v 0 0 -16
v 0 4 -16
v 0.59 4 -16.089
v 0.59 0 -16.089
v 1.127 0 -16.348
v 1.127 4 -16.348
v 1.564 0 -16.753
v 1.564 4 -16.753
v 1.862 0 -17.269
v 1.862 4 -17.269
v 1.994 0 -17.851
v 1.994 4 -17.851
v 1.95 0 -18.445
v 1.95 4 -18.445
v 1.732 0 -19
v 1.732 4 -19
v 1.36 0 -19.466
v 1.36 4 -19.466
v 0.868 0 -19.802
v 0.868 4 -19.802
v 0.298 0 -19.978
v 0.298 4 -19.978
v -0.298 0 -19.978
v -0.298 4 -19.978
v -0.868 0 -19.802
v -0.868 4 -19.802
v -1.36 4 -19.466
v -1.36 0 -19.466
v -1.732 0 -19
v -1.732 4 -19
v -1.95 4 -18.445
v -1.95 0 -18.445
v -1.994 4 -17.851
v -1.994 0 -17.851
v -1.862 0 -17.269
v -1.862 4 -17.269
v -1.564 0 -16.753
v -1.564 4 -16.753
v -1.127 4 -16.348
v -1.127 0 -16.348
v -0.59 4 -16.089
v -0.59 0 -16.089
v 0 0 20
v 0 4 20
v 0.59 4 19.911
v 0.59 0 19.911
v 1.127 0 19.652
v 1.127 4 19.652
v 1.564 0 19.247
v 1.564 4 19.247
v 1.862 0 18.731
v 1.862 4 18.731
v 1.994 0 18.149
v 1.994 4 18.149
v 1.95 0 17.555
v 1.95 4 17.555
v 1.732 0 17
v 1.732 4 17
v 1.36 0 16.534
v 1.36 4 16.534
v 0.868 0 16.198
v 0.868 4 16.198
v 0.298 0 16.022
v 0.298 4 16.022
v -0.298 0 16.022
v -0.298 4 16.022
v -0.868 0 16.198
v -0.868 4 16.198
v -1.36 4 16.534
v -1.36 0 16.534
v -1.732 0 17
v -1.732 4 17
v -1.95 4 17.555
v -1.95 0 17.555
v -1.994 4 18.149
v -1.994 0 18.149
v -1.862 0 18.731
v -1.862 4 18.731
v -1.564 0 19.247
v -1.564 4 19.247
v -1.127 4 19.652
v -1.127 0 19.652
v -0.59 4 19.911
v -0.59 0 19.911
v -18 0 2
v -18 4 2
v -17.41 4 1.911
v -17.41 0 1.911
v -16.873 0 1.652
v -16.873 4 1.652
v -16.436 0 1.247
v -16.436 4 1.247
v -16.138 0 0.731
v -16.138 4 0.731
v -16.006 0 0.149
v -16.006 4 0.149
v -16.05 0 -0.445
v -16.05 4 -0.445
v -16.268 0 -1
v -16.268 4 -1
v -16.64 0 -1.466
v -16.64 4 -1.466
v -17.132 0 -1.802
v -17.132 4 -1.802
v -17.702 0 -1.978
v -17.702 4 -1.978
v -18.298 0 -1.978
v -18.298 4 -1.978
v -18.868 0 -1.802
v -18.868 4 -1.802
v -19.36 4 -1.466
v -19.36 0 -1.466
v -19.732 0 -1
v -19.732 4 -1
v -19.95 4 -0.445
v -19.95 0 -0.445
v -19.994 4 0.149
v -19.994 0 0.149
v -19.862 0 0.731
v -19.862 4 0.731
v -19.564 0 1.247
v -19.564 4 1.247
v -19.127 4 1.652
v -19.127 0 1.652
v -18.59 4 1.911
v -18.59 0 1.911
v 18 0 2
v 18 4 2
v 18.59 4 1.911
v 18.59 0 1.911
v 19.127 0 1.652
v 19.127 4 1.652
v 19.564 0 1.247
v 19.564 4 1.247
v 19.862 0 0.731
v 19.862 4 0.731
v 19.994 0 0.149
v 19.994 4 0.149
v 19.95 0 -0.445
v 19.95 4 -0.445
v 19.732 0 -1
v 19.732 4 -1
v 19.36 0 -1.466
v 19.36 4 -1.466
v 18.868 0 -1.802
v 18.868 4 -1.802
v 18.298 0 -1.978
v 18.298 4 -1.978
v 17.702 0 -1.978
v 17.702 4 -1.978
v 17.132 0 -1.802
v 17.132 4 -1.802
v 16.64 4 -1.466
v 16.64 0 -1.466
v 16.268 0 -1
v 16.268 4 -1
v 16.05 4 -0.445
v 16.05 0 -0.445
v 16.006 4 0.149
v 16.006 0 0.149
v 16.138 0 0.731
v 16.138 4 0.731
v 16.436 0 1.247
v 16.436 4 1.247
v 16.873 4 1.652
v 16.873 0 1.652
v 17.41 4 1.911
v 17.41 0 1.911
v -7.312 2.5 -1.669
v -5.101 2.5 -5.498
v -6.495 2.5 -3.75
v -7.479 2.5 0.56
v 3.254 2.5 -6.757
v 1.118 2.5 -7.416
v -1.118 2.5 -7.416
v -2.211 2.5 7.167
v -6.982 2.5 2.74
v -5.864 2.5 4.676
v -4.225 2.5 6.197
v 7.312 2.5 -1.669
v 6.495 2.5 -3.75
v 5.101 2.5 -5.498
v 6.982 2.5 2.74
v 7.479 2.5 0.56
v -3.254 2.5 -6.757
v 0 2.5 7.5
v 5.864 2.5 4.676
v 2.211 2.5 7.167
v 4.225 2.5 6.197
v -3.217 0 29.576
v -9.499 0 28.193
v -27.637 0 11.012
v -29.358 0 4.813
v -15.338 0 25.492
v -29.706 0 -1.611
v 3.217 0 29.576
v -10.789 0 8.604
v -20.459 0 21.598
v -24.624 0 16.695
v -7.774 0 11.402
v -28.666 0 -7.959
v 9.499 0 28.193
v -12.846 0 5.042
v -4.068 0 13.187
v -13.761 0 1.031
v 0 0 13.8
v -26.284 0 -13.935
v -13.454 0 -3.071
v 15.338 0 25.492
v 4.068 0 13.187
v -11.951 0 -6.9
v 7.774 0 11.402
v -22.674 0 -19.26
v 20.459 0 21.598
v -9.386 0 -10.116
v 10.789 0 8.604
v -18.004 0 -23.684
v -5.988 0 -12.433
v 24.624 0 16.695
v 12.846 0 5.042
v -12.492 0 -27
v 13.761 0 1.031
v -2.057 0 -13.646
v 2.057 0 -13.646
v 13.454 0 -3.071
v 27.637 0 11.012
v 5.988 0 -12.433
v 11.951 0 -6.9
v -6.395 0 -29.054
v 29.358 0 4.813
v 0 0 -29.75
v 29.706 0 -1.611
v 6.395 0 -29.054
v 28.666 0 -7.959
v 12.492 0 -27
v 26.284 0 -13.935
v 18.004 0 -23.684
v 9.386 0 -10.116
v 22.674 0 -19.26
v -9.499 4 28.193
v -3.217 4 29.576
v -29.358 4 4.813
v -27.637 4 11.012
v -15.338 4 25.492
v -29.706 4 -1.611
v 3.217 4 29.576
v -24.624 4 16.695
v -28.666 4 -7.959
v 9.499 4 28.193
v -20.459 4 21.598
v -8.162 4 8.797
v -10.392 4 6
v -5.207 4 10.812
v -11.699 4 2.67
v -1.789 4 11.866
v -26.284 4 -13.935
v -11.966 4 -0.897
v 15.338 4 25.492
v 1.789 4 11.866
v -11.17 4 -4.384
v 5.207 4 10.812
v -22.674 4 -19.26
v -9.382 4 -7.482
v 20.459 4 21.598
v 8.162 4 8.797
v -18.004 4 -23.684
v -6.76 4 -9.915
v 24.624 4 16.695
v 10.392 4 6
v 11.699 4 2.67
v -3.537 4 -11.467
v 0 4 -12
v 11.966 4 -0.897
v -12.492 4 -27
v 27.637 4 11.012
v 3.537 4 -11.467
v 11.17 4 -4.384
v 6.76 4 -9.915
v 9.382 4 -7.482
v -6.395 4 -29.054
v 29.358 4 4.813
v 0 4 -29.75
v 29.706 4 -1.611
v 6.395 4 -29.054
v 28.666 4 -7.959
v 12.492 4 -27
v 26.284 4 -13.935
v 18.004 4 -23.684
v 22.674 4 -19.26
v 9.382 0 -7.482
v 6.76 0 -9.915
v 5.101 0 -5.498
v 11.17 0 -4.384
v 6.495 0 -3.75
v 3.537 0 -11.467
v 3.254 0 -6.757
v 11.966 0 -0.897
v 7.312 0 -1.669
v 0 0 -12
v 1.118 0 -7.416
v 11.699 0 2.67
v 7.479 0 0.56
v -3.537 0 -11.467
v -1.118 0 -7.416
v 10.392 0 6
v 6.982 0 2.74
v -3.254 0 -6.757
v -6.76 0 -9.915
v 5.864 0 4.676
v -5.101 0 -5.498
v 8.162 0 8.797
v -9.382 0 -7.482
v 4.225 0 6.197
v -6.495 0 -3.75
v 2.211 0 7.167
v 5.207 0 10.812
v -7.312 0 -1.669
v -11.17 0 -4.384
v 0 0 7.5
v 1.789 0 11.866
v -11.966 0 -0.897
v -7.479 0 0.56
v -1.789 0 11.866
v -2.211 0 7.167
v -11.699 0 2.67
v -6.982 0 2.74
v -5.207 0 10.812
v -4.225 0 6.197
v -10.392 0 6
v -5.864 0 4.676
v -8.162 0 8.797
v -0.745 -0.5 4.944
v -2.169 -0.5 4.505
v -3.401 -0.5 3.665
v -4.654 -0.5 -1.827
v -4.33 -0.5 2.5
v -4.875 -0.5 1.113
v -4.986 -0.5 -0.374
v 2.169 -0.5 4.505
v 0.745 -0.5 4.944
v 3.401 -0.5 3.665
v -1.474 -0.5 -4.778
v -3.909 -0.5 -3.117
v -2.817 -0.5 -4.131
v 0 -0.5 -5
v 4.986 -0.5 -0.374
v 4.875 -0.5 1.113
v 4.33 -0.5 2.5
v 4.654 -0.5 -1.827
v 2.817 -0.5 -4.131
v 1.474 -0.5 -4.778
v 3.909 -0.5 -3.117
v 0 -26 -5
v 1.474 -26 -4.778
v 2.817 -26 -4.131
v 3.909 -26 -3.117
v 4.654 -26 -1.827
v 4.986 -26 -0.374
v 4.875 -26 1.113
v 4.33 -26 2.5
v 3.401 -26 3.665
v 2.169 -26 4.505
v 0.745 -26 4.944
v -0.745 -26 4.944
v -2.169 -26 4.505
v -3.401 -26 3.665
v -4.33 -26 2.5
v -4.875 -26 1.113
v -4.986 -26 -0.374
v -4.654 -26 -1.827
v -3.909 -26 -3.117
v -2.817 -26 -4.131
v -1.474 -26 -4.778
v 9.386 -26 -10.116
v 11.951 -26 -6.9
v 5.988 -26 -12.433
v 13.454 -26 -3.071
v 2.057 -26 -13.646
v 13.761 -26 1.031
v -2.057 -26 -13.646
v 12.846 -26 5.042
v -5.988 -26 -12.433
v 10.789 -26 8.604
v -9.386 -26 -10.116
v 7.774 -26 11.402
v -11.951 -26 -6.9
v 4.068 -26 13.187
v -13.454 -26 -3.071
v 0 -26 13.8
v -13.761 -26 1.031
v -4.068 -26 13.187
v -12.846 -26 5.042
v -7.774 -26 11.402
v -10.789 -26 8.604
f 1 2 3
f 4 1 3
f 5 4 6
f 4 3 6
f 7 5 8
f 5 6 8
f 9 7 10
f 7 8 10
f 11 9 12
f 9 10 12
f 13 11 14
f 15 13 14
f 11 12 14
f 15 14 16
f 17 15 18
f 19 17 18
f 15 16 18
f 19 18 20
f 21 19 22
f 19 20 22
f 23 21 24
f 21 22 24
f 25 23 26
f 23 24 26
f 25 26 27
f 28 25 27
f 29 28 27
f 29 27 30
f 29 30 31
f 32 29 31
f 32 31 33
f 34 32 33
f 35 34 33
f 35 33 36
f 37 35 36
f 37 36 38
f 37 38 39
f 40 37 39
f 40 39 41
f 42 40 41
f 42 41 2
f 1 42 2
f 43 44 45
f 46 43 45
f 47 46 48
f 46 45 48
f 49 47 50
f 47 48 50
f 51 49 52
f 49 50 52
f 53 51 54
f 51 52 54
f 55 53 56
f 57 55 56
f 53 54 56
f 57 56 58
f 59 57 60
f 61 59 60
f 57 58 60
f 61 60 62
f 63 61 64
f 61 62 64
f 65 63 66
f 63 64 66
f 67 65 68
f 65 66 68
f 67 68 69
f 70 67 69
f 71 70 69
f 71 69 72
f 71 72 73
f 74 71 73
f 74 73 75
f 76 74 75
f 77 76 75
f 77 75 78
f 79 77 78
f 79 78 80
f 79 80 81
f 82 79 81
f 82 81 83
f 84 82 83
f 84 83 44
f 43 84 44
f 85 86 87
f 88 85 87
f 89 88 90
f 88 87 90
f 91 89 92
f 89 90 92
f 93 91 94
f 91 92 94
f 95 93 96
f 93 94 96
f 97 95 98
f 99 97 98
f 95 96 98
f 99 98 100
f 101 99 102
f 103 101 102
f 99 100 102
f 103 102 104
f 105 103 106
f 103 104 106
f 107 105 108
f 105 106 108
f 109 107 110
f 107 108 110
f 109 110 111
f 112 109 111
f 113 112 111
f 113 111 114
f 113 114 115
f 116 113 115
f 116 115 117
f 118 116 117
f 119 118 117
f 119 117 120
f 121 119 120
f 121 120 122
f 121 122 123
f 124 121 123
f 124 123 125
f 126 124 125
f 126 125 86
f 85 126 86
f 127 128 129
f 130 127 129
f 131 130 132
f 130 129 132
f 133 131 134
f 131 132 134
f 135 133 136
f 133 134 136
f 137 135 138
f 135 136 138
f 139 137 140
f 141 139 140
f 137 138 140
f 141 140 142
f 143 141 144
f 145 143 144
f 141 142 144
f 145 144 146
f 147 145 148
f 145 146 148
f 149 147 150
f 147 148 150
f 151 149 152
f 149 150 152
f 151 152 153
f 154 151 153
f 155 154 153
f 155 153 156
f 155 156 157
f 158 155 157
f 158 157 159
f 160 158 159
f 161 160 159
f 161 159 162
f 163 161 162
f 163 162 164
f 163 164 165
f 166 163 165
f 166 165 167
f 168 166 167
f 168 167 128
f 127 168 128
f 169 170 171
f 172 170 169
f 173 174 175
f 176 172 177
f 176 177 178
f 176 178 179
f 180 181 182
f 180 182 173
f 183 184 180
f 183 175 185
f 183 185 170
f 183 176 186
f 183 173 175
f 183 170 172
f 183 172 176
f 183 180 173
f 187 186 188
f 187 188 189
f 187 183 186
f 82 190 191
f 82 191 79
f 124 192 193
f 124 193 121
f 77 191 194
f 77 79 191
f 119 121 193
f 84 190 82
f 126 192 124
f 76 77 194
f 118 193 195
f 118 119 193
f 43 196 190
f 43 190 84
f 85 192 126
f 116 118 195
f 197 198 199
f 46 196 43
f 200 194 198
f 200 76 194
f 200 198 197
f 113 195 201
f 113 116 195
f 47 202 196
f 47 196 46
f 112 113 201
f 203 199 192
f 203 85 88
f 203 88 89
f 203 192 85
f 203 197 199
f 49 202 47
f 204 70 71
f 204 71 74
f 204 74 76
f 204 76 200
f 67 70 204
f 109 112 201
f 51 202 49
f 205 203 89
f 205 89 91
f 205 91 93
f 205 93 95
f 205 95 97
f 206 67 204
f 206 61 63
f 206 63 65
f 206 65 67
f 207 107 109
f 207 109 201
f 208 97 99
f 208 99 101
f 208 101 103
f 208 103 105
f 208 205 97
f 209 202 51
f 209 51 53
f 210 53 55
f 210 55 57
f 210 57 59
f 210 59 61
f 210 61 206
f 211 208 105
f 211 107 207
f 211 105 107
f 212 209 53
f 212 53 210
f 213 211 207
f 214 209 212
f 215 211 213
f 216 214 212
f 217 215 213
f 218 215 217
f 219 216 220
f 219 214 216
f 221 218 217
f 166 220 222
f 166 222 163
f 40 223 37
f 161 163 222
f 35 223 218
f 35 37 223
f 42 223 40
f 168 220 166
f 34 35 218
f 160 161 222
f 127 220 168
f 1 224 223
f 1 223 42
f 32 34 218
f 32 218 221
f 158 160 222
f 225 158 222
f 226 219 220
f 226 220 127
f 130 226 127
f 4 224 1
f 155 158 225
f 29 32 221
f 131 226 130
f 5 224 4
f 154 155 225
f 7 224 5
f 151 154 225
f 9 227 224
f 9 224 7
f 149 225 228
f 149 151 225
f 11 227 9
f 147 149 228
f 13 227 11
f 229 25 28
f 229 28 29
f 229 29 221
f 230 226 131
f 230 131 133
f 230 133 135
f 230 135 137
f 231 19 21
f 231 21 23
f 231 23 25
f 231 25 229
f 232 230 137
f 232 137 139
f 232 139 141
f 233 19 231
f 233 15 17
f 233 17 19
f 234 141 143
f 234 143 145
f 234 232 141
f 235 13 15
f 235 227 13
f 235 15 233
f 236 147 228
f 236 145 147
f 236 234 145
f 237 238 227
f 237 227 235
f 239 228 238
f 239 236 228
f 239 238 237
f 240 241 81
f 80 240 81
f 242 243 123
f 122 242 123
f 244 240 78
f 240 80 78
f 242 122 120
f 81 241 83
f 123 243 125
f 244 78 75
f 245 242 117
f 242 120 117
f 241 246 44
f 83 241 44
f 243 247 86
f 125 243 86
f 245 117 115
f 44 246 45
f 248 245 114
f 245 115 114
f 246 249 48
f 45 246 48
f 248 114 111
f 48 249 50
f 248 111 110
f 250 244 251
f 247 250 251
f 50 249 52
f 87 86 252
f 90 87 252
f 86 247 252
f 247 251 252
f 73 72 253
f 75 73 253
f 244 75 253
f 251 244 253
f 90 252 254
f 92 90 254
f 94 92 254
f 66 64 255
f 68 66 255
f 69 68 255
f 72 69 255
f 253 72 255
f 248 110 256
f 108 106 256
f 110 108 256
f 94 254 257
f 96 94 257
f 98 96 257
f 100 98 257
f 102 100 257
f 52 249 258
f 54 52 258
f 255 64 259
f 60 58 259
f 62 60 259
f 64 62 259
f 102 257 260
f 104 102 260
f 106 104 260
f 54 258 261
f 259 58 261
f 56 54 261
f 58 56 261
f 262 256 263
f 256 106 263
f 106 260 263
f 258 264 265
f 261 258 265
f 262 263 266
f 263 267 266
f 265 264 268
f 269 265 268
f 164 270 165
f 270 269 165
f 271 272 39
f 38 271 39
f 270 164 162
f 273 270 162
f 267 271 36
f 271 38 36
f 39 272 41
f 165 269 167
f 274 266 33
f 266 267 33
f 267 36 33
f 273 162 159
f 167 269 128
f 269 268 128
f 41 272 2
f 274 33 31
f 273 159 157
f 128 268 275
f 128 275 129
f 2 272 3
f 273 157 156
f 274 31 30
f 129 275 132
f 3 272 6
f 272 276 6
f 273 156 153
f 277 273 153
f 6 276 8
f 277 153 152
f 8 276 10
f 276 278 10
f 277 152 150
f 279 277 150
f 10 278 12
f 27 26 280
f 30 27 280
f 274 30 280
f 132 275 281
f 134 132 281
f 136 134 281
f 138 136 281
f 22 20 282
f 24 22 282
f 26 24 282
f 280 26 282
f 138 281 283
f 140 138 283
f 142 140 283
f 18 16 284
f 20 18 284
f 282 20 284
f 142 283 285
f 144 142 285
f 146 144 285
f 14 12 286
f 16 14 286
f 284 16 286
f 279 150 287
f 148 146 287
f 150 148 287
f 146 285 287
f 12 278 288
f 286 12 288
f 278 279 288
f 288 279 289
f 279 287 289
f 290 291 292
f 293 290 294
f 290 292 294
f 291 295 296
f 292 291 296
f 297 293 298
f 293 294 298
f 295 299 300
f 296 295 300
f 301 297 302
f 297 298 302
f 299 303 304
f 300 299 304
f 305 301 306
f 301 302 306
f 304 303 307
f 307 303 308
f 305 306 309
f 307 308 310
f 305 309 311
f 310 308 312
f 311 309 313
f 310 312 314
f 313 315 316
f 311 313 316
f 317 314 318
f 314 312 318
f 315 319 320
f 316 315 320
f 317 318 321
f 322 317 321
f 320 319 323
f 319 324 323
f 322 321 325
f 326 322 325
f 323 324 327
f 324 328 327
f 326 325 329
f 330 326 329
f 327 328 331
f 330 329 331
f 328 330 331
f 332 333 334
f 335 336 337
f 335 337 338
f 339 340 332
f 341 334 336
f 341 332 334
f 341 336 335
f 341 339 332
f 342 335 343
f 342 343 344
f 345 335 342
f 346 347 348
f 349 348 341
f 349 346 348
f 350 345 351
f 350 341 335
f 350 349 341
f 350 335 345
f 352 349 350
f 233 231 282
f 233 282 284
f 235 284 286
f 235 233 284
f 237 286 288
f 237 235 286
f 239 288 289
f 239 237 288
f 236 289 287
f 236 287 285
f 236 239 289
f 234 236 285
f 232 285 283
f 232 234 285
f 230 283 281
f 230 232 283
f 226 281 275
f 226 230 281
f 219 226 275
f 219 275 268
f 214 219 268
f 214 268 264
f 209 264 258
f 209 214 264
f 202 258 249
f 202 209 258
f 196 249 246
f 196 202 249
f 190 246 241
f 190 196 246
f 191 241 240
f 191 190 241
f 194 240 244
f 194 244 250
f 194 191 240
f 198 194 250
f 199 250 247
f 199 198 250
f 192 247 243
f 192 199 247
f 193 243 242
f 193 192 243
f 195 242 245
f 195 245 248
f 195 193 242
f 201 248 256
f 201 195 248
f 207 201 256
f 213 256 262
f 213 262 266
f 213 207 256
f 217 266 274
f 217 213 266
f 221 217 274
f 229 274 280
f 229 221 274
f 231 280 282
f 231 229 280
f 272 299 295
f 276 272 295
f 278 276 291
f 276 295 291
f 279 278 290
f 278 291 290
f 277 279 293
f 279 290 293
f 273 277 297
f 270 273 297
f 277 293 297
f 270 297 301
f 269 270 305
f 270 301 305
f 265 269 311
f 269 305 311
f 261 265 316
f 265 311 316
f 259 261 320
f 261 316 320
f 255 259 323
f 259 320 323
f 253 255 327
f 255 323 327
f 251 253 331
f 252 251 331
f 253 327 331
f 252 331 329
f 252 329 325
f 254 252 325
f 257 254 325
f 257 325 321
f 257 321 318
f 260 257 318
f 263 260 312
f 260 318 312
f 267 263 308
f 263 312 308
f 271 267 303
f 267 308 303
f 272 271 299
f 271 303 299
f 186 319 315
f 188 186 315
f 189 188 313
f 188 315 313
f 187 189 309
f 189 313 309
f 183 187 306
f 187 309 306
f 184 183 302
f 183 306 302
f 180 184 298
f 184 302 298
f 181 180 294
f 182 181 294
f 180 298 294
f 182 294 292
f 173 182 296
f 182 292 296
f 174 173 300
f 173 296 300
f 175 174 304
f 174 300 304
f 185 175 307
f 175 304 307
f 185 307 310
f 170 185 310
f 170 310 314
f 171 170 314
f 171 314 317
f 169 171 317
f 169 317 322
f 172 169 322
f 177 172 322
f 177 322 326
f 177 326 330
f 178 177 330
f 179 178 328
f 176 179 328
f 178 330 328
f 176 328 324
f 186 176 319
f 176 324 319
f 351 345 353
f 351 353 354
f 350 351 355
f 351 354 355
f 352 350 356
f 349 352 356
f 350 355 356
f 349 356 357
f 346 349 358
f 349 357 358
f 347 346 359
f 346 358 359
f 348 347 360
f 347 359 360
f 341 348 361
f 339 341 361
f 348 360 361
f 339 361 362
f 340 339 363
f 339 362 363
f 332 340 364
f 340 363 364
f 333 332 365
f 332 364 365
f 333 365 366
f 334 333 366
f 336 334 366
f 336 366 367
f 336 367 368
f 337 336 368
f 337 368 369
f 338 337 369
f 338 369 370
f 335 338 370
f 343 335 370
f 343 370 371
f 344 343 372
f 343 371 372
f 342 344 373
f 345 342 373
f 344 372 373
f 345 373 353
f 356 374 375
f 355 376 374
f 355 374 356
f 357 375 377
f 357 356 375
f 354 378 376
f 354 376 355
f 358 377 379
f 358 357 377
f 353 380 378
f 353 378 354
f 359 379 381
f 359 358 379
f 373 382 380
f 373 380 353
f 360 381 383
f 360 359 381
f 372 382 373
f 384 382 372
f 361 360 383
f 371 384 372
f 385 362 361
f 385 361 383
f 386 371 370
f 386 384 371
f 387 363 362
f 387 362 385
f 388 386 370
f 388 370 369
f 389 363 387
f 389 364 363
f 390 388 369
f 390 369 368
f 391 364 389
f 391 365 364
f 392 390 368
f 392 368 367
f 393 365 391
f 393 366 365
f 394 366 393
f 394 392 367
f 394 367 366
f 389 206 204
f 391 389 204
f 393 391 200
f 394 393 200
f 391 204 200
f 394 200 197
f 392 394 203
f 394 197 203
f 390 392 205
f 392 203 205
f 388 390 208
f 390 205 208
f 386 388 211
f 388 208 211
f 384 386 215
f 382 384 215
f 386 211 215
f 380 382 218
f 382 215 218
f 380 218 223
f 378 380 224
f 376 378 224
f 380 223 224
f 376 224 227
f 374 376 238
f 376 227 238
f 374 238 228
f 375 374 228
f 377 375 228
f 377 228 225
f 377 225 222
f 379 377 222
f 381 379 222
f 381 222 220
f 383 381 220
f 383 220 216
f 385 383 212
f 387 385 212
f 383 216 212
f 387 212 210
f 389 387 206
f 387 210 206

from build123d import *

# Parameters (mm, degrees)
SKETCH1_R           = 7.5
BOSS_EXTRUDE1_DEPTH = 2.5
SKETCH2_R           = 29.75
SKETCH2_R_2         = 12
BOSS_EXTRUDE2_DEPTH = 4
SKETCH3_R           = 13.8
BOSS_EXTRUDE3_DEPTH = 26
SKETCH4_R           = 5
CUT_EXTRUDE1_DEPTH  = 25.5
SKETCH5_R           = 2
CUT_EXTRUDE2_DEPTH  = 52.673252268


with BuildPart() as part:
    # Sketch1 → Boss-Extrude1 (new body)
    with BuildSketch(Plane(origin=(0, 0, 0), x_dir=(1, 0, 0), z_dir=(0, 1, 0))):
        with Locations(Location((0, 0, 0), (0, 0, 270))):
            Circle(SKETCH1_R)
    extrude(amount=BOSS_EXTRUDE1_DEPTH)



with BuildPart() as body_2:
    # Sketch2 → Boss-Extrude2 (new body)
    with BuildSketch(Plane.XZ):
        with Locations(Location((0, 0, 0), (0, 0, 270))):
            Circle(SKETCH2_R)
        with Locations(Location((0, 0, 0), (0, 0, 270))):
            Circle(SKETCH2_R_2, mode=Mode.SUBTRACT)
    extrude(amount=-BOSS_EXTRUDE2_DEPTH)


with BuildPart() as part_1:
    add(part.part)

    add(body_2.part)  # Boss-Extrude3 merges body 2
    # Sketch3 → Boss-Extrude3 (add)
    with BuildSketch(Plane.XZ):
        with Locations(Location((0, 0, 0), (0, 0, 90))):
            Circle(SKETCH3_R)
    extrude(amount=BOSS_EXTRUDE3_DEPTH)

    # Sketch4 → Cut-Extrude1 (cut)
    with BuildSketch(Plane.XZ.offset(26)):
        with Locations(Location((0, 0, 0), (0, 0, 270))):
            Circle(SKETCH4_R)
    extrude(amount=-CUT_EXTRUDE1_DEPTH, mode=Mode.SUBTRACT)

    # Sketch5 → Cut-Extrude2 (cut, through all)
    with BuildSketch(Plane(origin=(0, 4, 0), x_dir=(1, 0, 0), z_dir=(0, 1, 0))):
        with Locations(Location((0, 18, 0), (0, 0, 270))):
            Circle(SKETCH5_R)
        with Locations(Location((18, 0, 0), (0, 0, 270))):
            Circle(SKETCH5_R)
        with Locations(Location((0, -18, 0), (0, 0, 270))):
            Circle(SKETCH5_R)
        with Locations(Location((-18, 0, 0), (0, 0, 270))):
            Circle(SKETCH5_R)
    extrude(amount=-CUT_EXTRUDE2_DEPTH, mode=Mode.SUBTRACT)


solid = part_1.part
